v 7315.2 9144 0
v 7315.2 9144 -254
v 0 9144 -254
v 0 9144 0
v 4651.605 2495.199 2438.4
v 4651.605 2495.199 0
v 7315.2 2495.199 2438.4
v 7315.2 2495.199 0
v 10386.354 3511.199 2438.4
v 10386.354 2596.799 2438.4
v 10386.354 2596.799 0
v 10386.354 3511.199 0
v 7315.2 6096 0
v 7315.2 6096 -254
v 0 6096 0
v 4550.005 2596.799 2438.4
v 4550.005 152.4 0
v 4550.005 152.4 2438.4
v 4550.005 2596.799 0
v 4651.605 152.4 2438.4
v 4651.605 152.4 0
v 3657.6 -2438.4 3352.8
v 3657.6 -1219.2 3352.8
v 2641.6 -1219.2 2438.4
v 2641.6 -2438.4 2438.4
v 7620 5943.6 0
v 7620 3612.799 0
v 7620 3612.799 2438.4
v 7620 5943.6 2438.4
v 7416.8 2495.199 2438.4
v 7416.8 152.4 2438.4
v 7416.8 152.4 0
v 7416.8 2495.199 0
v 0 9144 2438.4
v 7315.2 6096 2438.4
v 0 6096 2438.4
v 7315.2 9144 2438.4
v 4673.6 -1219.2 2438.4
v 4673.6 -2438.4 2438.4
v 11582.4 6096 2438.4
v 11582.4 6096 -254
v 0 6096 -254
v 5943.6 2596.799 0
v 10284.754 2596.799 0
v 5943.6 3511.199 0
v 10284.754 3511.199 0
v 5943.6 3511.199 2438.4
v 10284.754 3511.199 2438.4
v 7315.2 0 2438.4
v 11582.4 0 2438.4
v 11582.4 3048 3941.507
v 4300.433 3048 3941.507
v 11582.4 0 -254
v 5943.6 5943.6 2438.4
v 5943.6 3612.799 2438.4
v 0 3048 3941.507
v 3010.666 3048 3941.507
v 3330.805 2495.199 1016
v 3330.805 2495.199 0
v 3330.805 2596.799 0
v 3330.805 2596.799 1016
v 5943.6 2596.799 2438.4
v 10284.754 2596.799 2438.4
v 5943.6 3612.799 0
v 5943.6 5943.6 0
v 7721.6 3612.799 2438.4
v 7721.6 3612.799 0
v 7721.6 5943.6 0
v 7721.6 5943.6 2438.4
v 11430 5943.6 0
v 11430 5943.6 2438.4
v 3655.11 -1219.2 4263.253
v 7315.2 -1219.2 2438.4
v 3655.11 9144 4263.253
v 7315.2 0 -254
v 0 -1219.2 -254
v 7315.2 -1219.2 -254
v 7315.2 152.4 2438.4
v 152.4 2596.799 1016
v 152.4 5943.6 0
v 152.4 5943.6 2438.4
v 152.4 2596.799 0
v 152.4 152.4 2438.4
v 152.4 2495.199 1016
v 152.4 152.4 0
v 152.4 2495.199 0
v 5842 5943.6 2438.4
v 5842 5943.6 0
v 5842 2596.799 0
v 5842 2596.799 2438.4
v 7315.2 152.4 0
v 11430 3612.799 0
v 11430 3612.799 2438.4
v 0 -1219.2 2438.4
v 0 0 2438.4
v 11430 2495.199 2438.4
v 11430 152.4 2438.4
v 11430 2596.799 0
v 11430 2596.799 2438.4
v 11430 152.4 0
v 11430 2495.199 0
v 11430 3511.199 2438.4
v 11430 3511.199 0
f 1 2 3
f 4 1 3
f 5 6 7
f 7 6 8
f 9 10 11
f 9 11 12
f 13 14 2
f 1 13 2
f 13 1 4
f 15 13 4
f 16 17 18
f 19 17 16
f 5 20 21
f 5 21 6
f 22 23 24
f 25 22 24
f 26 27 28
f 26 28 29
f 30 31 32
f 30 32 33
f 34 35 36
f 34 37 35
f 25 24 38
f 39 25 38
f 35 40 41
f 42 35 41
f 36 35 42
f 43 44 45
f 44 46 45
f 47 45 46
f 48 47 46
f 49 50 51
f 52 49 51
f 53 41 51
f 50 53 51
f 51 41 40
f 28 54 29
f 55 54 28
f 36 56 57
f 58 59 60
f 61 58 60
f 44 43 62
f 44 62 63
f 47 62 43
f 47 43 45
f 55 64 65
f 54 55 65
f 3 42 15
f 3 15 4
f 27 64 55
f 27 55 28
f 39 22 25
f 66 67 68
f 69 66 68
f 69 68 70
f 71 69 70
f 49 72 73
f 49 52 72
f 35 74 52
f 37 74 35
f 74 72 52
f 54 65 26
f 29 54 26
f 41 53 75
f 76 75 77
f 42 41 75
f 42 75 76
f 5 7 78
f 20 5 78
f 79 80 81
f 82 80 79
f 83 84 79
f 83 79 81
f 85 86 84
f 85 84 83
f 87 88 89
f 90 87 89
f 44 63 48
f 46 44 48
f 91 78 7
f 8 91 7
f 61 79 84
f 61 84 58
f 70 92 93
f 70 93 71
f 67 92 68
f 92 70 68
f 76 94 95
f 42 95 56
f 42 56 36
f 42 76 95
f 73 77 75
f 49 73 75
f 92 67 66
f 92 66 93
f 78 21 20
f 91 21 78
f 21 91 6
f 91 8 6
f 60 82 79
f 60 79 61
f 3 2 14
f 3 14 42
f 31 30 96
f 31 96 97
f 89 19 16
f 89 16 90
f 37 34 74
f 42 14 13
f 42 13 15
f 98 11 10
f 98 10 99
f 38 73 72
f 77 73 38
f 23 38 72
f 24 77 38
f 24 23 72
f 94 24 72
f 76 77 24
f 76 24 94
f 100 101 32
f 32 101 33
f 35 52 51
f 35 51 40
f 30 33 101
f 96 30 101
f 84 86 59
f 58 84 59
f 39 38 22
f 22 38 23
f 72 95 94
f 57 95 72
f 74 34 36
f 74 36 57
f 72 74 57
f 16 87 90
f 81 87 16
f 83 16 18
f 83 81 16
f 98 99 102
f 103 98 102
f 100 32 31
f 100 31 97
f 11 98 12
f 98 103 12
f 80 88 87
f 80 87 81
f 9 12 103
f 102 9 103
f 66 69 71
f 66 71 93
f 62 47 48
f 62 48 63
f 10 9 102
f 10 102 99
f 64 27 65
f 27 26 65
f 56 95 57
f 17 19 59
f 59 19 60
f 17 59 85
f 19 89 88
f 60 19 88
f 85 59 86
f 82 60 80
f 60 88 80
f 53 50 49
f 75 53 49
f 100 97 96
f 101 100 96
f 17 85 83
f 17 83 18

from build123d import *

# Parameters (mm, degrees)
SKETCH3_W           = 11582.4
SKETCH3_H           = 6096
SKETCH3_W_2         = 4341.154286856
SKETCH3_H_2         = 914.4
SKETCH3_W_3         = 1676.4
SKETCH3_H_3         = 2330.801356814
SKETCH3_W_4         = 2663.595025017
SKETCH3_H_4         = 2342.798643186
SKETCH3_W_5         = 1043.645713144
SKETCH3_W_6         = 4013.2
SKETCH3_W_7         = 3708.4
BOSS_EXTRUDE1_DEPTH = 2438.4
SKETCH4_W           = 11582.4
SKETCH4_H           = 6096
BOSS_EXTRUDE2_DEPTH = 254
SKETCH5_W           = 3178.404974983
SKETCH5_H           = 101.6
BOSS_EXTRUDE3_DEPTH = 1016
BOSS_EXTRUDE4_DEPTH = 11582.4
SKETCH8_W           = 7315.2
SKETCH8_H           = 3048
BOSS_EXTRUDE6_DEPTH = 254
BOSS_EXTRUDE7_DEPTH = 10363.2
SKETCH12_W          = 7315.2
SKETCH12_H          = 1219.2
BOSS_EXTRUDE8_DEPTH = 2692.4
BOSS_EXTRUDE9_DEPTH = 1219.2


with BuildPart() as part:
    # Sketch3 → Boss-Extrude1 (new body)
    with BuildSketch(Plane.XY):
        with Locations((5791.2, 3048)):
            Rectangle(SKETCH3_W, SKETCH3_H)
        Polygon((152.4, 152.4), (4550.004974983, 152.4), (4550.004974983, 2596.798643186), (5842, 2596.798643186), (5842, 3511.198643186), (5842, 5943.6), (152.4, 5943.6), align=None, mode=Mode.SUBTRACT)
        with Locations((8114.177143428, 3053.998643186)):
            Rectangle(SKETCH3_W_2, SKETCH3_H_2, mode=Mode.SUBTRACT)
        with Locations((6781.8, 4778.199321593)):
            Rectangle(SKETCH3_W_3, SKETCH3_H_3, mode=Mode.SUBTRACT)
        with Locations((5983.402487492, 1323.799321593)):
            Rectangle(SKETCH3_W_4, SKETCH3_H_4, mode=Mode.SUBTRACT)
        with Locations((10908.177143428, 3053.998643186)):
            Rectangle(SKETCH3_W_5, SKETCH3_H_2, mode=Mode.SUBTRACT)
        with Locations((9423.4, 1323.799321593)):
            Rectangle(SKETCH3_W_6, SKETCH3_H_4, mode=Mode.SUBTRACT)
        with Locations((9575.8, 4778.199321593)):
            Rectangle(SKETCH3_W_7, SKETCH3_H_3, mode=Mode.SUBTRACT)
    extrude(amount=BOSS_EXTRUDE1_DEPTH)

    # Sketch4 → Boss-Extrude2 (add)
    with BuildSketch(Plane(origin=(0, 0, 0), x_dir=(-1, 0, 0), z_dir=(0, 0, -1))):
        with Locations((-5791.2, 3048)):
            Rectangle(SKETCH4_W, SKETCH4_H)
    extrude(amount=BOSS_EXTRUDE2_DEPTH)

    # Sketch5 → Boss-Extrude3 (add)
    with BuildSketch(Plane.XY):
        with Locations((1741.602487492, 2545.998643186)):
            Rectangle(SKETCH5_W, SKETCH5_H)
    extrude(amount=BOSS_EXTRUDE3_DEPTH)

    # Sketch6 → Boss-Extrude4 (add)
    with BuildSketch(Plane.ZY):
        Polygon((2438.4, 6096), (2438.4, 0), (3941.507258543, 3048), align=None)
    extrude(amount=-BOSS_EXTRUDE4_DEPTH)

    # Sketch10 → Boss-Extrude7 (add)
    with BuildSketch(Plane(origin=(0, 9144, 0), x_dir=(1, 0, 0), z_dir=(0, 1, 0))):
        Polygon((7315.2, -2438.4), (0, -2438.4), (3655.110432816, -4263.253342026), align=None)
    extrude(amount=-BOSS_EXTRUDE7_DEPTH)

    # Sketch12 → Boss-Extrude8 (add)
    with BuildSketch(Plane(origin=(0, 0, -254), x_dir=(-1, 0, 0), z_dir=(0, 0, -1))):
        with Locations((-3657.6, -609.6)):
            Rectangle(SKETCH12_W, SKETCH12_H)
    extrude(amount=-BOSS_EXTRUDE8_DEPTH)

    # Sketch15 → Boss-Extrude9 (add)
    with BuildSketch(Plane.XZ.offset(1219.2)):
        Polygon((2641.6, 2438.4), (4673.6, 2438.4), (3657.6, 3352.8), align=None)
    extrude(amount=BOSS_EXTRUDE9_DEPTH)


with BuildPart() as body_2:
    # Sketch8 → Boss-Extrude6 (new body)
    with BuildSketch(Plane(origin=(0, 0, -254), x_dir=(-1, 0, 0), z_dir=(0, 0, -1))):
        with Locations((-3657.6, 7620)):
            Rectangle(SKETCH8_W, SKETCH8_H)
    extrude(amount=-BOSS_EXTRUDE6_DEPTH)


solid = Compound([part.part, body_2.part])
